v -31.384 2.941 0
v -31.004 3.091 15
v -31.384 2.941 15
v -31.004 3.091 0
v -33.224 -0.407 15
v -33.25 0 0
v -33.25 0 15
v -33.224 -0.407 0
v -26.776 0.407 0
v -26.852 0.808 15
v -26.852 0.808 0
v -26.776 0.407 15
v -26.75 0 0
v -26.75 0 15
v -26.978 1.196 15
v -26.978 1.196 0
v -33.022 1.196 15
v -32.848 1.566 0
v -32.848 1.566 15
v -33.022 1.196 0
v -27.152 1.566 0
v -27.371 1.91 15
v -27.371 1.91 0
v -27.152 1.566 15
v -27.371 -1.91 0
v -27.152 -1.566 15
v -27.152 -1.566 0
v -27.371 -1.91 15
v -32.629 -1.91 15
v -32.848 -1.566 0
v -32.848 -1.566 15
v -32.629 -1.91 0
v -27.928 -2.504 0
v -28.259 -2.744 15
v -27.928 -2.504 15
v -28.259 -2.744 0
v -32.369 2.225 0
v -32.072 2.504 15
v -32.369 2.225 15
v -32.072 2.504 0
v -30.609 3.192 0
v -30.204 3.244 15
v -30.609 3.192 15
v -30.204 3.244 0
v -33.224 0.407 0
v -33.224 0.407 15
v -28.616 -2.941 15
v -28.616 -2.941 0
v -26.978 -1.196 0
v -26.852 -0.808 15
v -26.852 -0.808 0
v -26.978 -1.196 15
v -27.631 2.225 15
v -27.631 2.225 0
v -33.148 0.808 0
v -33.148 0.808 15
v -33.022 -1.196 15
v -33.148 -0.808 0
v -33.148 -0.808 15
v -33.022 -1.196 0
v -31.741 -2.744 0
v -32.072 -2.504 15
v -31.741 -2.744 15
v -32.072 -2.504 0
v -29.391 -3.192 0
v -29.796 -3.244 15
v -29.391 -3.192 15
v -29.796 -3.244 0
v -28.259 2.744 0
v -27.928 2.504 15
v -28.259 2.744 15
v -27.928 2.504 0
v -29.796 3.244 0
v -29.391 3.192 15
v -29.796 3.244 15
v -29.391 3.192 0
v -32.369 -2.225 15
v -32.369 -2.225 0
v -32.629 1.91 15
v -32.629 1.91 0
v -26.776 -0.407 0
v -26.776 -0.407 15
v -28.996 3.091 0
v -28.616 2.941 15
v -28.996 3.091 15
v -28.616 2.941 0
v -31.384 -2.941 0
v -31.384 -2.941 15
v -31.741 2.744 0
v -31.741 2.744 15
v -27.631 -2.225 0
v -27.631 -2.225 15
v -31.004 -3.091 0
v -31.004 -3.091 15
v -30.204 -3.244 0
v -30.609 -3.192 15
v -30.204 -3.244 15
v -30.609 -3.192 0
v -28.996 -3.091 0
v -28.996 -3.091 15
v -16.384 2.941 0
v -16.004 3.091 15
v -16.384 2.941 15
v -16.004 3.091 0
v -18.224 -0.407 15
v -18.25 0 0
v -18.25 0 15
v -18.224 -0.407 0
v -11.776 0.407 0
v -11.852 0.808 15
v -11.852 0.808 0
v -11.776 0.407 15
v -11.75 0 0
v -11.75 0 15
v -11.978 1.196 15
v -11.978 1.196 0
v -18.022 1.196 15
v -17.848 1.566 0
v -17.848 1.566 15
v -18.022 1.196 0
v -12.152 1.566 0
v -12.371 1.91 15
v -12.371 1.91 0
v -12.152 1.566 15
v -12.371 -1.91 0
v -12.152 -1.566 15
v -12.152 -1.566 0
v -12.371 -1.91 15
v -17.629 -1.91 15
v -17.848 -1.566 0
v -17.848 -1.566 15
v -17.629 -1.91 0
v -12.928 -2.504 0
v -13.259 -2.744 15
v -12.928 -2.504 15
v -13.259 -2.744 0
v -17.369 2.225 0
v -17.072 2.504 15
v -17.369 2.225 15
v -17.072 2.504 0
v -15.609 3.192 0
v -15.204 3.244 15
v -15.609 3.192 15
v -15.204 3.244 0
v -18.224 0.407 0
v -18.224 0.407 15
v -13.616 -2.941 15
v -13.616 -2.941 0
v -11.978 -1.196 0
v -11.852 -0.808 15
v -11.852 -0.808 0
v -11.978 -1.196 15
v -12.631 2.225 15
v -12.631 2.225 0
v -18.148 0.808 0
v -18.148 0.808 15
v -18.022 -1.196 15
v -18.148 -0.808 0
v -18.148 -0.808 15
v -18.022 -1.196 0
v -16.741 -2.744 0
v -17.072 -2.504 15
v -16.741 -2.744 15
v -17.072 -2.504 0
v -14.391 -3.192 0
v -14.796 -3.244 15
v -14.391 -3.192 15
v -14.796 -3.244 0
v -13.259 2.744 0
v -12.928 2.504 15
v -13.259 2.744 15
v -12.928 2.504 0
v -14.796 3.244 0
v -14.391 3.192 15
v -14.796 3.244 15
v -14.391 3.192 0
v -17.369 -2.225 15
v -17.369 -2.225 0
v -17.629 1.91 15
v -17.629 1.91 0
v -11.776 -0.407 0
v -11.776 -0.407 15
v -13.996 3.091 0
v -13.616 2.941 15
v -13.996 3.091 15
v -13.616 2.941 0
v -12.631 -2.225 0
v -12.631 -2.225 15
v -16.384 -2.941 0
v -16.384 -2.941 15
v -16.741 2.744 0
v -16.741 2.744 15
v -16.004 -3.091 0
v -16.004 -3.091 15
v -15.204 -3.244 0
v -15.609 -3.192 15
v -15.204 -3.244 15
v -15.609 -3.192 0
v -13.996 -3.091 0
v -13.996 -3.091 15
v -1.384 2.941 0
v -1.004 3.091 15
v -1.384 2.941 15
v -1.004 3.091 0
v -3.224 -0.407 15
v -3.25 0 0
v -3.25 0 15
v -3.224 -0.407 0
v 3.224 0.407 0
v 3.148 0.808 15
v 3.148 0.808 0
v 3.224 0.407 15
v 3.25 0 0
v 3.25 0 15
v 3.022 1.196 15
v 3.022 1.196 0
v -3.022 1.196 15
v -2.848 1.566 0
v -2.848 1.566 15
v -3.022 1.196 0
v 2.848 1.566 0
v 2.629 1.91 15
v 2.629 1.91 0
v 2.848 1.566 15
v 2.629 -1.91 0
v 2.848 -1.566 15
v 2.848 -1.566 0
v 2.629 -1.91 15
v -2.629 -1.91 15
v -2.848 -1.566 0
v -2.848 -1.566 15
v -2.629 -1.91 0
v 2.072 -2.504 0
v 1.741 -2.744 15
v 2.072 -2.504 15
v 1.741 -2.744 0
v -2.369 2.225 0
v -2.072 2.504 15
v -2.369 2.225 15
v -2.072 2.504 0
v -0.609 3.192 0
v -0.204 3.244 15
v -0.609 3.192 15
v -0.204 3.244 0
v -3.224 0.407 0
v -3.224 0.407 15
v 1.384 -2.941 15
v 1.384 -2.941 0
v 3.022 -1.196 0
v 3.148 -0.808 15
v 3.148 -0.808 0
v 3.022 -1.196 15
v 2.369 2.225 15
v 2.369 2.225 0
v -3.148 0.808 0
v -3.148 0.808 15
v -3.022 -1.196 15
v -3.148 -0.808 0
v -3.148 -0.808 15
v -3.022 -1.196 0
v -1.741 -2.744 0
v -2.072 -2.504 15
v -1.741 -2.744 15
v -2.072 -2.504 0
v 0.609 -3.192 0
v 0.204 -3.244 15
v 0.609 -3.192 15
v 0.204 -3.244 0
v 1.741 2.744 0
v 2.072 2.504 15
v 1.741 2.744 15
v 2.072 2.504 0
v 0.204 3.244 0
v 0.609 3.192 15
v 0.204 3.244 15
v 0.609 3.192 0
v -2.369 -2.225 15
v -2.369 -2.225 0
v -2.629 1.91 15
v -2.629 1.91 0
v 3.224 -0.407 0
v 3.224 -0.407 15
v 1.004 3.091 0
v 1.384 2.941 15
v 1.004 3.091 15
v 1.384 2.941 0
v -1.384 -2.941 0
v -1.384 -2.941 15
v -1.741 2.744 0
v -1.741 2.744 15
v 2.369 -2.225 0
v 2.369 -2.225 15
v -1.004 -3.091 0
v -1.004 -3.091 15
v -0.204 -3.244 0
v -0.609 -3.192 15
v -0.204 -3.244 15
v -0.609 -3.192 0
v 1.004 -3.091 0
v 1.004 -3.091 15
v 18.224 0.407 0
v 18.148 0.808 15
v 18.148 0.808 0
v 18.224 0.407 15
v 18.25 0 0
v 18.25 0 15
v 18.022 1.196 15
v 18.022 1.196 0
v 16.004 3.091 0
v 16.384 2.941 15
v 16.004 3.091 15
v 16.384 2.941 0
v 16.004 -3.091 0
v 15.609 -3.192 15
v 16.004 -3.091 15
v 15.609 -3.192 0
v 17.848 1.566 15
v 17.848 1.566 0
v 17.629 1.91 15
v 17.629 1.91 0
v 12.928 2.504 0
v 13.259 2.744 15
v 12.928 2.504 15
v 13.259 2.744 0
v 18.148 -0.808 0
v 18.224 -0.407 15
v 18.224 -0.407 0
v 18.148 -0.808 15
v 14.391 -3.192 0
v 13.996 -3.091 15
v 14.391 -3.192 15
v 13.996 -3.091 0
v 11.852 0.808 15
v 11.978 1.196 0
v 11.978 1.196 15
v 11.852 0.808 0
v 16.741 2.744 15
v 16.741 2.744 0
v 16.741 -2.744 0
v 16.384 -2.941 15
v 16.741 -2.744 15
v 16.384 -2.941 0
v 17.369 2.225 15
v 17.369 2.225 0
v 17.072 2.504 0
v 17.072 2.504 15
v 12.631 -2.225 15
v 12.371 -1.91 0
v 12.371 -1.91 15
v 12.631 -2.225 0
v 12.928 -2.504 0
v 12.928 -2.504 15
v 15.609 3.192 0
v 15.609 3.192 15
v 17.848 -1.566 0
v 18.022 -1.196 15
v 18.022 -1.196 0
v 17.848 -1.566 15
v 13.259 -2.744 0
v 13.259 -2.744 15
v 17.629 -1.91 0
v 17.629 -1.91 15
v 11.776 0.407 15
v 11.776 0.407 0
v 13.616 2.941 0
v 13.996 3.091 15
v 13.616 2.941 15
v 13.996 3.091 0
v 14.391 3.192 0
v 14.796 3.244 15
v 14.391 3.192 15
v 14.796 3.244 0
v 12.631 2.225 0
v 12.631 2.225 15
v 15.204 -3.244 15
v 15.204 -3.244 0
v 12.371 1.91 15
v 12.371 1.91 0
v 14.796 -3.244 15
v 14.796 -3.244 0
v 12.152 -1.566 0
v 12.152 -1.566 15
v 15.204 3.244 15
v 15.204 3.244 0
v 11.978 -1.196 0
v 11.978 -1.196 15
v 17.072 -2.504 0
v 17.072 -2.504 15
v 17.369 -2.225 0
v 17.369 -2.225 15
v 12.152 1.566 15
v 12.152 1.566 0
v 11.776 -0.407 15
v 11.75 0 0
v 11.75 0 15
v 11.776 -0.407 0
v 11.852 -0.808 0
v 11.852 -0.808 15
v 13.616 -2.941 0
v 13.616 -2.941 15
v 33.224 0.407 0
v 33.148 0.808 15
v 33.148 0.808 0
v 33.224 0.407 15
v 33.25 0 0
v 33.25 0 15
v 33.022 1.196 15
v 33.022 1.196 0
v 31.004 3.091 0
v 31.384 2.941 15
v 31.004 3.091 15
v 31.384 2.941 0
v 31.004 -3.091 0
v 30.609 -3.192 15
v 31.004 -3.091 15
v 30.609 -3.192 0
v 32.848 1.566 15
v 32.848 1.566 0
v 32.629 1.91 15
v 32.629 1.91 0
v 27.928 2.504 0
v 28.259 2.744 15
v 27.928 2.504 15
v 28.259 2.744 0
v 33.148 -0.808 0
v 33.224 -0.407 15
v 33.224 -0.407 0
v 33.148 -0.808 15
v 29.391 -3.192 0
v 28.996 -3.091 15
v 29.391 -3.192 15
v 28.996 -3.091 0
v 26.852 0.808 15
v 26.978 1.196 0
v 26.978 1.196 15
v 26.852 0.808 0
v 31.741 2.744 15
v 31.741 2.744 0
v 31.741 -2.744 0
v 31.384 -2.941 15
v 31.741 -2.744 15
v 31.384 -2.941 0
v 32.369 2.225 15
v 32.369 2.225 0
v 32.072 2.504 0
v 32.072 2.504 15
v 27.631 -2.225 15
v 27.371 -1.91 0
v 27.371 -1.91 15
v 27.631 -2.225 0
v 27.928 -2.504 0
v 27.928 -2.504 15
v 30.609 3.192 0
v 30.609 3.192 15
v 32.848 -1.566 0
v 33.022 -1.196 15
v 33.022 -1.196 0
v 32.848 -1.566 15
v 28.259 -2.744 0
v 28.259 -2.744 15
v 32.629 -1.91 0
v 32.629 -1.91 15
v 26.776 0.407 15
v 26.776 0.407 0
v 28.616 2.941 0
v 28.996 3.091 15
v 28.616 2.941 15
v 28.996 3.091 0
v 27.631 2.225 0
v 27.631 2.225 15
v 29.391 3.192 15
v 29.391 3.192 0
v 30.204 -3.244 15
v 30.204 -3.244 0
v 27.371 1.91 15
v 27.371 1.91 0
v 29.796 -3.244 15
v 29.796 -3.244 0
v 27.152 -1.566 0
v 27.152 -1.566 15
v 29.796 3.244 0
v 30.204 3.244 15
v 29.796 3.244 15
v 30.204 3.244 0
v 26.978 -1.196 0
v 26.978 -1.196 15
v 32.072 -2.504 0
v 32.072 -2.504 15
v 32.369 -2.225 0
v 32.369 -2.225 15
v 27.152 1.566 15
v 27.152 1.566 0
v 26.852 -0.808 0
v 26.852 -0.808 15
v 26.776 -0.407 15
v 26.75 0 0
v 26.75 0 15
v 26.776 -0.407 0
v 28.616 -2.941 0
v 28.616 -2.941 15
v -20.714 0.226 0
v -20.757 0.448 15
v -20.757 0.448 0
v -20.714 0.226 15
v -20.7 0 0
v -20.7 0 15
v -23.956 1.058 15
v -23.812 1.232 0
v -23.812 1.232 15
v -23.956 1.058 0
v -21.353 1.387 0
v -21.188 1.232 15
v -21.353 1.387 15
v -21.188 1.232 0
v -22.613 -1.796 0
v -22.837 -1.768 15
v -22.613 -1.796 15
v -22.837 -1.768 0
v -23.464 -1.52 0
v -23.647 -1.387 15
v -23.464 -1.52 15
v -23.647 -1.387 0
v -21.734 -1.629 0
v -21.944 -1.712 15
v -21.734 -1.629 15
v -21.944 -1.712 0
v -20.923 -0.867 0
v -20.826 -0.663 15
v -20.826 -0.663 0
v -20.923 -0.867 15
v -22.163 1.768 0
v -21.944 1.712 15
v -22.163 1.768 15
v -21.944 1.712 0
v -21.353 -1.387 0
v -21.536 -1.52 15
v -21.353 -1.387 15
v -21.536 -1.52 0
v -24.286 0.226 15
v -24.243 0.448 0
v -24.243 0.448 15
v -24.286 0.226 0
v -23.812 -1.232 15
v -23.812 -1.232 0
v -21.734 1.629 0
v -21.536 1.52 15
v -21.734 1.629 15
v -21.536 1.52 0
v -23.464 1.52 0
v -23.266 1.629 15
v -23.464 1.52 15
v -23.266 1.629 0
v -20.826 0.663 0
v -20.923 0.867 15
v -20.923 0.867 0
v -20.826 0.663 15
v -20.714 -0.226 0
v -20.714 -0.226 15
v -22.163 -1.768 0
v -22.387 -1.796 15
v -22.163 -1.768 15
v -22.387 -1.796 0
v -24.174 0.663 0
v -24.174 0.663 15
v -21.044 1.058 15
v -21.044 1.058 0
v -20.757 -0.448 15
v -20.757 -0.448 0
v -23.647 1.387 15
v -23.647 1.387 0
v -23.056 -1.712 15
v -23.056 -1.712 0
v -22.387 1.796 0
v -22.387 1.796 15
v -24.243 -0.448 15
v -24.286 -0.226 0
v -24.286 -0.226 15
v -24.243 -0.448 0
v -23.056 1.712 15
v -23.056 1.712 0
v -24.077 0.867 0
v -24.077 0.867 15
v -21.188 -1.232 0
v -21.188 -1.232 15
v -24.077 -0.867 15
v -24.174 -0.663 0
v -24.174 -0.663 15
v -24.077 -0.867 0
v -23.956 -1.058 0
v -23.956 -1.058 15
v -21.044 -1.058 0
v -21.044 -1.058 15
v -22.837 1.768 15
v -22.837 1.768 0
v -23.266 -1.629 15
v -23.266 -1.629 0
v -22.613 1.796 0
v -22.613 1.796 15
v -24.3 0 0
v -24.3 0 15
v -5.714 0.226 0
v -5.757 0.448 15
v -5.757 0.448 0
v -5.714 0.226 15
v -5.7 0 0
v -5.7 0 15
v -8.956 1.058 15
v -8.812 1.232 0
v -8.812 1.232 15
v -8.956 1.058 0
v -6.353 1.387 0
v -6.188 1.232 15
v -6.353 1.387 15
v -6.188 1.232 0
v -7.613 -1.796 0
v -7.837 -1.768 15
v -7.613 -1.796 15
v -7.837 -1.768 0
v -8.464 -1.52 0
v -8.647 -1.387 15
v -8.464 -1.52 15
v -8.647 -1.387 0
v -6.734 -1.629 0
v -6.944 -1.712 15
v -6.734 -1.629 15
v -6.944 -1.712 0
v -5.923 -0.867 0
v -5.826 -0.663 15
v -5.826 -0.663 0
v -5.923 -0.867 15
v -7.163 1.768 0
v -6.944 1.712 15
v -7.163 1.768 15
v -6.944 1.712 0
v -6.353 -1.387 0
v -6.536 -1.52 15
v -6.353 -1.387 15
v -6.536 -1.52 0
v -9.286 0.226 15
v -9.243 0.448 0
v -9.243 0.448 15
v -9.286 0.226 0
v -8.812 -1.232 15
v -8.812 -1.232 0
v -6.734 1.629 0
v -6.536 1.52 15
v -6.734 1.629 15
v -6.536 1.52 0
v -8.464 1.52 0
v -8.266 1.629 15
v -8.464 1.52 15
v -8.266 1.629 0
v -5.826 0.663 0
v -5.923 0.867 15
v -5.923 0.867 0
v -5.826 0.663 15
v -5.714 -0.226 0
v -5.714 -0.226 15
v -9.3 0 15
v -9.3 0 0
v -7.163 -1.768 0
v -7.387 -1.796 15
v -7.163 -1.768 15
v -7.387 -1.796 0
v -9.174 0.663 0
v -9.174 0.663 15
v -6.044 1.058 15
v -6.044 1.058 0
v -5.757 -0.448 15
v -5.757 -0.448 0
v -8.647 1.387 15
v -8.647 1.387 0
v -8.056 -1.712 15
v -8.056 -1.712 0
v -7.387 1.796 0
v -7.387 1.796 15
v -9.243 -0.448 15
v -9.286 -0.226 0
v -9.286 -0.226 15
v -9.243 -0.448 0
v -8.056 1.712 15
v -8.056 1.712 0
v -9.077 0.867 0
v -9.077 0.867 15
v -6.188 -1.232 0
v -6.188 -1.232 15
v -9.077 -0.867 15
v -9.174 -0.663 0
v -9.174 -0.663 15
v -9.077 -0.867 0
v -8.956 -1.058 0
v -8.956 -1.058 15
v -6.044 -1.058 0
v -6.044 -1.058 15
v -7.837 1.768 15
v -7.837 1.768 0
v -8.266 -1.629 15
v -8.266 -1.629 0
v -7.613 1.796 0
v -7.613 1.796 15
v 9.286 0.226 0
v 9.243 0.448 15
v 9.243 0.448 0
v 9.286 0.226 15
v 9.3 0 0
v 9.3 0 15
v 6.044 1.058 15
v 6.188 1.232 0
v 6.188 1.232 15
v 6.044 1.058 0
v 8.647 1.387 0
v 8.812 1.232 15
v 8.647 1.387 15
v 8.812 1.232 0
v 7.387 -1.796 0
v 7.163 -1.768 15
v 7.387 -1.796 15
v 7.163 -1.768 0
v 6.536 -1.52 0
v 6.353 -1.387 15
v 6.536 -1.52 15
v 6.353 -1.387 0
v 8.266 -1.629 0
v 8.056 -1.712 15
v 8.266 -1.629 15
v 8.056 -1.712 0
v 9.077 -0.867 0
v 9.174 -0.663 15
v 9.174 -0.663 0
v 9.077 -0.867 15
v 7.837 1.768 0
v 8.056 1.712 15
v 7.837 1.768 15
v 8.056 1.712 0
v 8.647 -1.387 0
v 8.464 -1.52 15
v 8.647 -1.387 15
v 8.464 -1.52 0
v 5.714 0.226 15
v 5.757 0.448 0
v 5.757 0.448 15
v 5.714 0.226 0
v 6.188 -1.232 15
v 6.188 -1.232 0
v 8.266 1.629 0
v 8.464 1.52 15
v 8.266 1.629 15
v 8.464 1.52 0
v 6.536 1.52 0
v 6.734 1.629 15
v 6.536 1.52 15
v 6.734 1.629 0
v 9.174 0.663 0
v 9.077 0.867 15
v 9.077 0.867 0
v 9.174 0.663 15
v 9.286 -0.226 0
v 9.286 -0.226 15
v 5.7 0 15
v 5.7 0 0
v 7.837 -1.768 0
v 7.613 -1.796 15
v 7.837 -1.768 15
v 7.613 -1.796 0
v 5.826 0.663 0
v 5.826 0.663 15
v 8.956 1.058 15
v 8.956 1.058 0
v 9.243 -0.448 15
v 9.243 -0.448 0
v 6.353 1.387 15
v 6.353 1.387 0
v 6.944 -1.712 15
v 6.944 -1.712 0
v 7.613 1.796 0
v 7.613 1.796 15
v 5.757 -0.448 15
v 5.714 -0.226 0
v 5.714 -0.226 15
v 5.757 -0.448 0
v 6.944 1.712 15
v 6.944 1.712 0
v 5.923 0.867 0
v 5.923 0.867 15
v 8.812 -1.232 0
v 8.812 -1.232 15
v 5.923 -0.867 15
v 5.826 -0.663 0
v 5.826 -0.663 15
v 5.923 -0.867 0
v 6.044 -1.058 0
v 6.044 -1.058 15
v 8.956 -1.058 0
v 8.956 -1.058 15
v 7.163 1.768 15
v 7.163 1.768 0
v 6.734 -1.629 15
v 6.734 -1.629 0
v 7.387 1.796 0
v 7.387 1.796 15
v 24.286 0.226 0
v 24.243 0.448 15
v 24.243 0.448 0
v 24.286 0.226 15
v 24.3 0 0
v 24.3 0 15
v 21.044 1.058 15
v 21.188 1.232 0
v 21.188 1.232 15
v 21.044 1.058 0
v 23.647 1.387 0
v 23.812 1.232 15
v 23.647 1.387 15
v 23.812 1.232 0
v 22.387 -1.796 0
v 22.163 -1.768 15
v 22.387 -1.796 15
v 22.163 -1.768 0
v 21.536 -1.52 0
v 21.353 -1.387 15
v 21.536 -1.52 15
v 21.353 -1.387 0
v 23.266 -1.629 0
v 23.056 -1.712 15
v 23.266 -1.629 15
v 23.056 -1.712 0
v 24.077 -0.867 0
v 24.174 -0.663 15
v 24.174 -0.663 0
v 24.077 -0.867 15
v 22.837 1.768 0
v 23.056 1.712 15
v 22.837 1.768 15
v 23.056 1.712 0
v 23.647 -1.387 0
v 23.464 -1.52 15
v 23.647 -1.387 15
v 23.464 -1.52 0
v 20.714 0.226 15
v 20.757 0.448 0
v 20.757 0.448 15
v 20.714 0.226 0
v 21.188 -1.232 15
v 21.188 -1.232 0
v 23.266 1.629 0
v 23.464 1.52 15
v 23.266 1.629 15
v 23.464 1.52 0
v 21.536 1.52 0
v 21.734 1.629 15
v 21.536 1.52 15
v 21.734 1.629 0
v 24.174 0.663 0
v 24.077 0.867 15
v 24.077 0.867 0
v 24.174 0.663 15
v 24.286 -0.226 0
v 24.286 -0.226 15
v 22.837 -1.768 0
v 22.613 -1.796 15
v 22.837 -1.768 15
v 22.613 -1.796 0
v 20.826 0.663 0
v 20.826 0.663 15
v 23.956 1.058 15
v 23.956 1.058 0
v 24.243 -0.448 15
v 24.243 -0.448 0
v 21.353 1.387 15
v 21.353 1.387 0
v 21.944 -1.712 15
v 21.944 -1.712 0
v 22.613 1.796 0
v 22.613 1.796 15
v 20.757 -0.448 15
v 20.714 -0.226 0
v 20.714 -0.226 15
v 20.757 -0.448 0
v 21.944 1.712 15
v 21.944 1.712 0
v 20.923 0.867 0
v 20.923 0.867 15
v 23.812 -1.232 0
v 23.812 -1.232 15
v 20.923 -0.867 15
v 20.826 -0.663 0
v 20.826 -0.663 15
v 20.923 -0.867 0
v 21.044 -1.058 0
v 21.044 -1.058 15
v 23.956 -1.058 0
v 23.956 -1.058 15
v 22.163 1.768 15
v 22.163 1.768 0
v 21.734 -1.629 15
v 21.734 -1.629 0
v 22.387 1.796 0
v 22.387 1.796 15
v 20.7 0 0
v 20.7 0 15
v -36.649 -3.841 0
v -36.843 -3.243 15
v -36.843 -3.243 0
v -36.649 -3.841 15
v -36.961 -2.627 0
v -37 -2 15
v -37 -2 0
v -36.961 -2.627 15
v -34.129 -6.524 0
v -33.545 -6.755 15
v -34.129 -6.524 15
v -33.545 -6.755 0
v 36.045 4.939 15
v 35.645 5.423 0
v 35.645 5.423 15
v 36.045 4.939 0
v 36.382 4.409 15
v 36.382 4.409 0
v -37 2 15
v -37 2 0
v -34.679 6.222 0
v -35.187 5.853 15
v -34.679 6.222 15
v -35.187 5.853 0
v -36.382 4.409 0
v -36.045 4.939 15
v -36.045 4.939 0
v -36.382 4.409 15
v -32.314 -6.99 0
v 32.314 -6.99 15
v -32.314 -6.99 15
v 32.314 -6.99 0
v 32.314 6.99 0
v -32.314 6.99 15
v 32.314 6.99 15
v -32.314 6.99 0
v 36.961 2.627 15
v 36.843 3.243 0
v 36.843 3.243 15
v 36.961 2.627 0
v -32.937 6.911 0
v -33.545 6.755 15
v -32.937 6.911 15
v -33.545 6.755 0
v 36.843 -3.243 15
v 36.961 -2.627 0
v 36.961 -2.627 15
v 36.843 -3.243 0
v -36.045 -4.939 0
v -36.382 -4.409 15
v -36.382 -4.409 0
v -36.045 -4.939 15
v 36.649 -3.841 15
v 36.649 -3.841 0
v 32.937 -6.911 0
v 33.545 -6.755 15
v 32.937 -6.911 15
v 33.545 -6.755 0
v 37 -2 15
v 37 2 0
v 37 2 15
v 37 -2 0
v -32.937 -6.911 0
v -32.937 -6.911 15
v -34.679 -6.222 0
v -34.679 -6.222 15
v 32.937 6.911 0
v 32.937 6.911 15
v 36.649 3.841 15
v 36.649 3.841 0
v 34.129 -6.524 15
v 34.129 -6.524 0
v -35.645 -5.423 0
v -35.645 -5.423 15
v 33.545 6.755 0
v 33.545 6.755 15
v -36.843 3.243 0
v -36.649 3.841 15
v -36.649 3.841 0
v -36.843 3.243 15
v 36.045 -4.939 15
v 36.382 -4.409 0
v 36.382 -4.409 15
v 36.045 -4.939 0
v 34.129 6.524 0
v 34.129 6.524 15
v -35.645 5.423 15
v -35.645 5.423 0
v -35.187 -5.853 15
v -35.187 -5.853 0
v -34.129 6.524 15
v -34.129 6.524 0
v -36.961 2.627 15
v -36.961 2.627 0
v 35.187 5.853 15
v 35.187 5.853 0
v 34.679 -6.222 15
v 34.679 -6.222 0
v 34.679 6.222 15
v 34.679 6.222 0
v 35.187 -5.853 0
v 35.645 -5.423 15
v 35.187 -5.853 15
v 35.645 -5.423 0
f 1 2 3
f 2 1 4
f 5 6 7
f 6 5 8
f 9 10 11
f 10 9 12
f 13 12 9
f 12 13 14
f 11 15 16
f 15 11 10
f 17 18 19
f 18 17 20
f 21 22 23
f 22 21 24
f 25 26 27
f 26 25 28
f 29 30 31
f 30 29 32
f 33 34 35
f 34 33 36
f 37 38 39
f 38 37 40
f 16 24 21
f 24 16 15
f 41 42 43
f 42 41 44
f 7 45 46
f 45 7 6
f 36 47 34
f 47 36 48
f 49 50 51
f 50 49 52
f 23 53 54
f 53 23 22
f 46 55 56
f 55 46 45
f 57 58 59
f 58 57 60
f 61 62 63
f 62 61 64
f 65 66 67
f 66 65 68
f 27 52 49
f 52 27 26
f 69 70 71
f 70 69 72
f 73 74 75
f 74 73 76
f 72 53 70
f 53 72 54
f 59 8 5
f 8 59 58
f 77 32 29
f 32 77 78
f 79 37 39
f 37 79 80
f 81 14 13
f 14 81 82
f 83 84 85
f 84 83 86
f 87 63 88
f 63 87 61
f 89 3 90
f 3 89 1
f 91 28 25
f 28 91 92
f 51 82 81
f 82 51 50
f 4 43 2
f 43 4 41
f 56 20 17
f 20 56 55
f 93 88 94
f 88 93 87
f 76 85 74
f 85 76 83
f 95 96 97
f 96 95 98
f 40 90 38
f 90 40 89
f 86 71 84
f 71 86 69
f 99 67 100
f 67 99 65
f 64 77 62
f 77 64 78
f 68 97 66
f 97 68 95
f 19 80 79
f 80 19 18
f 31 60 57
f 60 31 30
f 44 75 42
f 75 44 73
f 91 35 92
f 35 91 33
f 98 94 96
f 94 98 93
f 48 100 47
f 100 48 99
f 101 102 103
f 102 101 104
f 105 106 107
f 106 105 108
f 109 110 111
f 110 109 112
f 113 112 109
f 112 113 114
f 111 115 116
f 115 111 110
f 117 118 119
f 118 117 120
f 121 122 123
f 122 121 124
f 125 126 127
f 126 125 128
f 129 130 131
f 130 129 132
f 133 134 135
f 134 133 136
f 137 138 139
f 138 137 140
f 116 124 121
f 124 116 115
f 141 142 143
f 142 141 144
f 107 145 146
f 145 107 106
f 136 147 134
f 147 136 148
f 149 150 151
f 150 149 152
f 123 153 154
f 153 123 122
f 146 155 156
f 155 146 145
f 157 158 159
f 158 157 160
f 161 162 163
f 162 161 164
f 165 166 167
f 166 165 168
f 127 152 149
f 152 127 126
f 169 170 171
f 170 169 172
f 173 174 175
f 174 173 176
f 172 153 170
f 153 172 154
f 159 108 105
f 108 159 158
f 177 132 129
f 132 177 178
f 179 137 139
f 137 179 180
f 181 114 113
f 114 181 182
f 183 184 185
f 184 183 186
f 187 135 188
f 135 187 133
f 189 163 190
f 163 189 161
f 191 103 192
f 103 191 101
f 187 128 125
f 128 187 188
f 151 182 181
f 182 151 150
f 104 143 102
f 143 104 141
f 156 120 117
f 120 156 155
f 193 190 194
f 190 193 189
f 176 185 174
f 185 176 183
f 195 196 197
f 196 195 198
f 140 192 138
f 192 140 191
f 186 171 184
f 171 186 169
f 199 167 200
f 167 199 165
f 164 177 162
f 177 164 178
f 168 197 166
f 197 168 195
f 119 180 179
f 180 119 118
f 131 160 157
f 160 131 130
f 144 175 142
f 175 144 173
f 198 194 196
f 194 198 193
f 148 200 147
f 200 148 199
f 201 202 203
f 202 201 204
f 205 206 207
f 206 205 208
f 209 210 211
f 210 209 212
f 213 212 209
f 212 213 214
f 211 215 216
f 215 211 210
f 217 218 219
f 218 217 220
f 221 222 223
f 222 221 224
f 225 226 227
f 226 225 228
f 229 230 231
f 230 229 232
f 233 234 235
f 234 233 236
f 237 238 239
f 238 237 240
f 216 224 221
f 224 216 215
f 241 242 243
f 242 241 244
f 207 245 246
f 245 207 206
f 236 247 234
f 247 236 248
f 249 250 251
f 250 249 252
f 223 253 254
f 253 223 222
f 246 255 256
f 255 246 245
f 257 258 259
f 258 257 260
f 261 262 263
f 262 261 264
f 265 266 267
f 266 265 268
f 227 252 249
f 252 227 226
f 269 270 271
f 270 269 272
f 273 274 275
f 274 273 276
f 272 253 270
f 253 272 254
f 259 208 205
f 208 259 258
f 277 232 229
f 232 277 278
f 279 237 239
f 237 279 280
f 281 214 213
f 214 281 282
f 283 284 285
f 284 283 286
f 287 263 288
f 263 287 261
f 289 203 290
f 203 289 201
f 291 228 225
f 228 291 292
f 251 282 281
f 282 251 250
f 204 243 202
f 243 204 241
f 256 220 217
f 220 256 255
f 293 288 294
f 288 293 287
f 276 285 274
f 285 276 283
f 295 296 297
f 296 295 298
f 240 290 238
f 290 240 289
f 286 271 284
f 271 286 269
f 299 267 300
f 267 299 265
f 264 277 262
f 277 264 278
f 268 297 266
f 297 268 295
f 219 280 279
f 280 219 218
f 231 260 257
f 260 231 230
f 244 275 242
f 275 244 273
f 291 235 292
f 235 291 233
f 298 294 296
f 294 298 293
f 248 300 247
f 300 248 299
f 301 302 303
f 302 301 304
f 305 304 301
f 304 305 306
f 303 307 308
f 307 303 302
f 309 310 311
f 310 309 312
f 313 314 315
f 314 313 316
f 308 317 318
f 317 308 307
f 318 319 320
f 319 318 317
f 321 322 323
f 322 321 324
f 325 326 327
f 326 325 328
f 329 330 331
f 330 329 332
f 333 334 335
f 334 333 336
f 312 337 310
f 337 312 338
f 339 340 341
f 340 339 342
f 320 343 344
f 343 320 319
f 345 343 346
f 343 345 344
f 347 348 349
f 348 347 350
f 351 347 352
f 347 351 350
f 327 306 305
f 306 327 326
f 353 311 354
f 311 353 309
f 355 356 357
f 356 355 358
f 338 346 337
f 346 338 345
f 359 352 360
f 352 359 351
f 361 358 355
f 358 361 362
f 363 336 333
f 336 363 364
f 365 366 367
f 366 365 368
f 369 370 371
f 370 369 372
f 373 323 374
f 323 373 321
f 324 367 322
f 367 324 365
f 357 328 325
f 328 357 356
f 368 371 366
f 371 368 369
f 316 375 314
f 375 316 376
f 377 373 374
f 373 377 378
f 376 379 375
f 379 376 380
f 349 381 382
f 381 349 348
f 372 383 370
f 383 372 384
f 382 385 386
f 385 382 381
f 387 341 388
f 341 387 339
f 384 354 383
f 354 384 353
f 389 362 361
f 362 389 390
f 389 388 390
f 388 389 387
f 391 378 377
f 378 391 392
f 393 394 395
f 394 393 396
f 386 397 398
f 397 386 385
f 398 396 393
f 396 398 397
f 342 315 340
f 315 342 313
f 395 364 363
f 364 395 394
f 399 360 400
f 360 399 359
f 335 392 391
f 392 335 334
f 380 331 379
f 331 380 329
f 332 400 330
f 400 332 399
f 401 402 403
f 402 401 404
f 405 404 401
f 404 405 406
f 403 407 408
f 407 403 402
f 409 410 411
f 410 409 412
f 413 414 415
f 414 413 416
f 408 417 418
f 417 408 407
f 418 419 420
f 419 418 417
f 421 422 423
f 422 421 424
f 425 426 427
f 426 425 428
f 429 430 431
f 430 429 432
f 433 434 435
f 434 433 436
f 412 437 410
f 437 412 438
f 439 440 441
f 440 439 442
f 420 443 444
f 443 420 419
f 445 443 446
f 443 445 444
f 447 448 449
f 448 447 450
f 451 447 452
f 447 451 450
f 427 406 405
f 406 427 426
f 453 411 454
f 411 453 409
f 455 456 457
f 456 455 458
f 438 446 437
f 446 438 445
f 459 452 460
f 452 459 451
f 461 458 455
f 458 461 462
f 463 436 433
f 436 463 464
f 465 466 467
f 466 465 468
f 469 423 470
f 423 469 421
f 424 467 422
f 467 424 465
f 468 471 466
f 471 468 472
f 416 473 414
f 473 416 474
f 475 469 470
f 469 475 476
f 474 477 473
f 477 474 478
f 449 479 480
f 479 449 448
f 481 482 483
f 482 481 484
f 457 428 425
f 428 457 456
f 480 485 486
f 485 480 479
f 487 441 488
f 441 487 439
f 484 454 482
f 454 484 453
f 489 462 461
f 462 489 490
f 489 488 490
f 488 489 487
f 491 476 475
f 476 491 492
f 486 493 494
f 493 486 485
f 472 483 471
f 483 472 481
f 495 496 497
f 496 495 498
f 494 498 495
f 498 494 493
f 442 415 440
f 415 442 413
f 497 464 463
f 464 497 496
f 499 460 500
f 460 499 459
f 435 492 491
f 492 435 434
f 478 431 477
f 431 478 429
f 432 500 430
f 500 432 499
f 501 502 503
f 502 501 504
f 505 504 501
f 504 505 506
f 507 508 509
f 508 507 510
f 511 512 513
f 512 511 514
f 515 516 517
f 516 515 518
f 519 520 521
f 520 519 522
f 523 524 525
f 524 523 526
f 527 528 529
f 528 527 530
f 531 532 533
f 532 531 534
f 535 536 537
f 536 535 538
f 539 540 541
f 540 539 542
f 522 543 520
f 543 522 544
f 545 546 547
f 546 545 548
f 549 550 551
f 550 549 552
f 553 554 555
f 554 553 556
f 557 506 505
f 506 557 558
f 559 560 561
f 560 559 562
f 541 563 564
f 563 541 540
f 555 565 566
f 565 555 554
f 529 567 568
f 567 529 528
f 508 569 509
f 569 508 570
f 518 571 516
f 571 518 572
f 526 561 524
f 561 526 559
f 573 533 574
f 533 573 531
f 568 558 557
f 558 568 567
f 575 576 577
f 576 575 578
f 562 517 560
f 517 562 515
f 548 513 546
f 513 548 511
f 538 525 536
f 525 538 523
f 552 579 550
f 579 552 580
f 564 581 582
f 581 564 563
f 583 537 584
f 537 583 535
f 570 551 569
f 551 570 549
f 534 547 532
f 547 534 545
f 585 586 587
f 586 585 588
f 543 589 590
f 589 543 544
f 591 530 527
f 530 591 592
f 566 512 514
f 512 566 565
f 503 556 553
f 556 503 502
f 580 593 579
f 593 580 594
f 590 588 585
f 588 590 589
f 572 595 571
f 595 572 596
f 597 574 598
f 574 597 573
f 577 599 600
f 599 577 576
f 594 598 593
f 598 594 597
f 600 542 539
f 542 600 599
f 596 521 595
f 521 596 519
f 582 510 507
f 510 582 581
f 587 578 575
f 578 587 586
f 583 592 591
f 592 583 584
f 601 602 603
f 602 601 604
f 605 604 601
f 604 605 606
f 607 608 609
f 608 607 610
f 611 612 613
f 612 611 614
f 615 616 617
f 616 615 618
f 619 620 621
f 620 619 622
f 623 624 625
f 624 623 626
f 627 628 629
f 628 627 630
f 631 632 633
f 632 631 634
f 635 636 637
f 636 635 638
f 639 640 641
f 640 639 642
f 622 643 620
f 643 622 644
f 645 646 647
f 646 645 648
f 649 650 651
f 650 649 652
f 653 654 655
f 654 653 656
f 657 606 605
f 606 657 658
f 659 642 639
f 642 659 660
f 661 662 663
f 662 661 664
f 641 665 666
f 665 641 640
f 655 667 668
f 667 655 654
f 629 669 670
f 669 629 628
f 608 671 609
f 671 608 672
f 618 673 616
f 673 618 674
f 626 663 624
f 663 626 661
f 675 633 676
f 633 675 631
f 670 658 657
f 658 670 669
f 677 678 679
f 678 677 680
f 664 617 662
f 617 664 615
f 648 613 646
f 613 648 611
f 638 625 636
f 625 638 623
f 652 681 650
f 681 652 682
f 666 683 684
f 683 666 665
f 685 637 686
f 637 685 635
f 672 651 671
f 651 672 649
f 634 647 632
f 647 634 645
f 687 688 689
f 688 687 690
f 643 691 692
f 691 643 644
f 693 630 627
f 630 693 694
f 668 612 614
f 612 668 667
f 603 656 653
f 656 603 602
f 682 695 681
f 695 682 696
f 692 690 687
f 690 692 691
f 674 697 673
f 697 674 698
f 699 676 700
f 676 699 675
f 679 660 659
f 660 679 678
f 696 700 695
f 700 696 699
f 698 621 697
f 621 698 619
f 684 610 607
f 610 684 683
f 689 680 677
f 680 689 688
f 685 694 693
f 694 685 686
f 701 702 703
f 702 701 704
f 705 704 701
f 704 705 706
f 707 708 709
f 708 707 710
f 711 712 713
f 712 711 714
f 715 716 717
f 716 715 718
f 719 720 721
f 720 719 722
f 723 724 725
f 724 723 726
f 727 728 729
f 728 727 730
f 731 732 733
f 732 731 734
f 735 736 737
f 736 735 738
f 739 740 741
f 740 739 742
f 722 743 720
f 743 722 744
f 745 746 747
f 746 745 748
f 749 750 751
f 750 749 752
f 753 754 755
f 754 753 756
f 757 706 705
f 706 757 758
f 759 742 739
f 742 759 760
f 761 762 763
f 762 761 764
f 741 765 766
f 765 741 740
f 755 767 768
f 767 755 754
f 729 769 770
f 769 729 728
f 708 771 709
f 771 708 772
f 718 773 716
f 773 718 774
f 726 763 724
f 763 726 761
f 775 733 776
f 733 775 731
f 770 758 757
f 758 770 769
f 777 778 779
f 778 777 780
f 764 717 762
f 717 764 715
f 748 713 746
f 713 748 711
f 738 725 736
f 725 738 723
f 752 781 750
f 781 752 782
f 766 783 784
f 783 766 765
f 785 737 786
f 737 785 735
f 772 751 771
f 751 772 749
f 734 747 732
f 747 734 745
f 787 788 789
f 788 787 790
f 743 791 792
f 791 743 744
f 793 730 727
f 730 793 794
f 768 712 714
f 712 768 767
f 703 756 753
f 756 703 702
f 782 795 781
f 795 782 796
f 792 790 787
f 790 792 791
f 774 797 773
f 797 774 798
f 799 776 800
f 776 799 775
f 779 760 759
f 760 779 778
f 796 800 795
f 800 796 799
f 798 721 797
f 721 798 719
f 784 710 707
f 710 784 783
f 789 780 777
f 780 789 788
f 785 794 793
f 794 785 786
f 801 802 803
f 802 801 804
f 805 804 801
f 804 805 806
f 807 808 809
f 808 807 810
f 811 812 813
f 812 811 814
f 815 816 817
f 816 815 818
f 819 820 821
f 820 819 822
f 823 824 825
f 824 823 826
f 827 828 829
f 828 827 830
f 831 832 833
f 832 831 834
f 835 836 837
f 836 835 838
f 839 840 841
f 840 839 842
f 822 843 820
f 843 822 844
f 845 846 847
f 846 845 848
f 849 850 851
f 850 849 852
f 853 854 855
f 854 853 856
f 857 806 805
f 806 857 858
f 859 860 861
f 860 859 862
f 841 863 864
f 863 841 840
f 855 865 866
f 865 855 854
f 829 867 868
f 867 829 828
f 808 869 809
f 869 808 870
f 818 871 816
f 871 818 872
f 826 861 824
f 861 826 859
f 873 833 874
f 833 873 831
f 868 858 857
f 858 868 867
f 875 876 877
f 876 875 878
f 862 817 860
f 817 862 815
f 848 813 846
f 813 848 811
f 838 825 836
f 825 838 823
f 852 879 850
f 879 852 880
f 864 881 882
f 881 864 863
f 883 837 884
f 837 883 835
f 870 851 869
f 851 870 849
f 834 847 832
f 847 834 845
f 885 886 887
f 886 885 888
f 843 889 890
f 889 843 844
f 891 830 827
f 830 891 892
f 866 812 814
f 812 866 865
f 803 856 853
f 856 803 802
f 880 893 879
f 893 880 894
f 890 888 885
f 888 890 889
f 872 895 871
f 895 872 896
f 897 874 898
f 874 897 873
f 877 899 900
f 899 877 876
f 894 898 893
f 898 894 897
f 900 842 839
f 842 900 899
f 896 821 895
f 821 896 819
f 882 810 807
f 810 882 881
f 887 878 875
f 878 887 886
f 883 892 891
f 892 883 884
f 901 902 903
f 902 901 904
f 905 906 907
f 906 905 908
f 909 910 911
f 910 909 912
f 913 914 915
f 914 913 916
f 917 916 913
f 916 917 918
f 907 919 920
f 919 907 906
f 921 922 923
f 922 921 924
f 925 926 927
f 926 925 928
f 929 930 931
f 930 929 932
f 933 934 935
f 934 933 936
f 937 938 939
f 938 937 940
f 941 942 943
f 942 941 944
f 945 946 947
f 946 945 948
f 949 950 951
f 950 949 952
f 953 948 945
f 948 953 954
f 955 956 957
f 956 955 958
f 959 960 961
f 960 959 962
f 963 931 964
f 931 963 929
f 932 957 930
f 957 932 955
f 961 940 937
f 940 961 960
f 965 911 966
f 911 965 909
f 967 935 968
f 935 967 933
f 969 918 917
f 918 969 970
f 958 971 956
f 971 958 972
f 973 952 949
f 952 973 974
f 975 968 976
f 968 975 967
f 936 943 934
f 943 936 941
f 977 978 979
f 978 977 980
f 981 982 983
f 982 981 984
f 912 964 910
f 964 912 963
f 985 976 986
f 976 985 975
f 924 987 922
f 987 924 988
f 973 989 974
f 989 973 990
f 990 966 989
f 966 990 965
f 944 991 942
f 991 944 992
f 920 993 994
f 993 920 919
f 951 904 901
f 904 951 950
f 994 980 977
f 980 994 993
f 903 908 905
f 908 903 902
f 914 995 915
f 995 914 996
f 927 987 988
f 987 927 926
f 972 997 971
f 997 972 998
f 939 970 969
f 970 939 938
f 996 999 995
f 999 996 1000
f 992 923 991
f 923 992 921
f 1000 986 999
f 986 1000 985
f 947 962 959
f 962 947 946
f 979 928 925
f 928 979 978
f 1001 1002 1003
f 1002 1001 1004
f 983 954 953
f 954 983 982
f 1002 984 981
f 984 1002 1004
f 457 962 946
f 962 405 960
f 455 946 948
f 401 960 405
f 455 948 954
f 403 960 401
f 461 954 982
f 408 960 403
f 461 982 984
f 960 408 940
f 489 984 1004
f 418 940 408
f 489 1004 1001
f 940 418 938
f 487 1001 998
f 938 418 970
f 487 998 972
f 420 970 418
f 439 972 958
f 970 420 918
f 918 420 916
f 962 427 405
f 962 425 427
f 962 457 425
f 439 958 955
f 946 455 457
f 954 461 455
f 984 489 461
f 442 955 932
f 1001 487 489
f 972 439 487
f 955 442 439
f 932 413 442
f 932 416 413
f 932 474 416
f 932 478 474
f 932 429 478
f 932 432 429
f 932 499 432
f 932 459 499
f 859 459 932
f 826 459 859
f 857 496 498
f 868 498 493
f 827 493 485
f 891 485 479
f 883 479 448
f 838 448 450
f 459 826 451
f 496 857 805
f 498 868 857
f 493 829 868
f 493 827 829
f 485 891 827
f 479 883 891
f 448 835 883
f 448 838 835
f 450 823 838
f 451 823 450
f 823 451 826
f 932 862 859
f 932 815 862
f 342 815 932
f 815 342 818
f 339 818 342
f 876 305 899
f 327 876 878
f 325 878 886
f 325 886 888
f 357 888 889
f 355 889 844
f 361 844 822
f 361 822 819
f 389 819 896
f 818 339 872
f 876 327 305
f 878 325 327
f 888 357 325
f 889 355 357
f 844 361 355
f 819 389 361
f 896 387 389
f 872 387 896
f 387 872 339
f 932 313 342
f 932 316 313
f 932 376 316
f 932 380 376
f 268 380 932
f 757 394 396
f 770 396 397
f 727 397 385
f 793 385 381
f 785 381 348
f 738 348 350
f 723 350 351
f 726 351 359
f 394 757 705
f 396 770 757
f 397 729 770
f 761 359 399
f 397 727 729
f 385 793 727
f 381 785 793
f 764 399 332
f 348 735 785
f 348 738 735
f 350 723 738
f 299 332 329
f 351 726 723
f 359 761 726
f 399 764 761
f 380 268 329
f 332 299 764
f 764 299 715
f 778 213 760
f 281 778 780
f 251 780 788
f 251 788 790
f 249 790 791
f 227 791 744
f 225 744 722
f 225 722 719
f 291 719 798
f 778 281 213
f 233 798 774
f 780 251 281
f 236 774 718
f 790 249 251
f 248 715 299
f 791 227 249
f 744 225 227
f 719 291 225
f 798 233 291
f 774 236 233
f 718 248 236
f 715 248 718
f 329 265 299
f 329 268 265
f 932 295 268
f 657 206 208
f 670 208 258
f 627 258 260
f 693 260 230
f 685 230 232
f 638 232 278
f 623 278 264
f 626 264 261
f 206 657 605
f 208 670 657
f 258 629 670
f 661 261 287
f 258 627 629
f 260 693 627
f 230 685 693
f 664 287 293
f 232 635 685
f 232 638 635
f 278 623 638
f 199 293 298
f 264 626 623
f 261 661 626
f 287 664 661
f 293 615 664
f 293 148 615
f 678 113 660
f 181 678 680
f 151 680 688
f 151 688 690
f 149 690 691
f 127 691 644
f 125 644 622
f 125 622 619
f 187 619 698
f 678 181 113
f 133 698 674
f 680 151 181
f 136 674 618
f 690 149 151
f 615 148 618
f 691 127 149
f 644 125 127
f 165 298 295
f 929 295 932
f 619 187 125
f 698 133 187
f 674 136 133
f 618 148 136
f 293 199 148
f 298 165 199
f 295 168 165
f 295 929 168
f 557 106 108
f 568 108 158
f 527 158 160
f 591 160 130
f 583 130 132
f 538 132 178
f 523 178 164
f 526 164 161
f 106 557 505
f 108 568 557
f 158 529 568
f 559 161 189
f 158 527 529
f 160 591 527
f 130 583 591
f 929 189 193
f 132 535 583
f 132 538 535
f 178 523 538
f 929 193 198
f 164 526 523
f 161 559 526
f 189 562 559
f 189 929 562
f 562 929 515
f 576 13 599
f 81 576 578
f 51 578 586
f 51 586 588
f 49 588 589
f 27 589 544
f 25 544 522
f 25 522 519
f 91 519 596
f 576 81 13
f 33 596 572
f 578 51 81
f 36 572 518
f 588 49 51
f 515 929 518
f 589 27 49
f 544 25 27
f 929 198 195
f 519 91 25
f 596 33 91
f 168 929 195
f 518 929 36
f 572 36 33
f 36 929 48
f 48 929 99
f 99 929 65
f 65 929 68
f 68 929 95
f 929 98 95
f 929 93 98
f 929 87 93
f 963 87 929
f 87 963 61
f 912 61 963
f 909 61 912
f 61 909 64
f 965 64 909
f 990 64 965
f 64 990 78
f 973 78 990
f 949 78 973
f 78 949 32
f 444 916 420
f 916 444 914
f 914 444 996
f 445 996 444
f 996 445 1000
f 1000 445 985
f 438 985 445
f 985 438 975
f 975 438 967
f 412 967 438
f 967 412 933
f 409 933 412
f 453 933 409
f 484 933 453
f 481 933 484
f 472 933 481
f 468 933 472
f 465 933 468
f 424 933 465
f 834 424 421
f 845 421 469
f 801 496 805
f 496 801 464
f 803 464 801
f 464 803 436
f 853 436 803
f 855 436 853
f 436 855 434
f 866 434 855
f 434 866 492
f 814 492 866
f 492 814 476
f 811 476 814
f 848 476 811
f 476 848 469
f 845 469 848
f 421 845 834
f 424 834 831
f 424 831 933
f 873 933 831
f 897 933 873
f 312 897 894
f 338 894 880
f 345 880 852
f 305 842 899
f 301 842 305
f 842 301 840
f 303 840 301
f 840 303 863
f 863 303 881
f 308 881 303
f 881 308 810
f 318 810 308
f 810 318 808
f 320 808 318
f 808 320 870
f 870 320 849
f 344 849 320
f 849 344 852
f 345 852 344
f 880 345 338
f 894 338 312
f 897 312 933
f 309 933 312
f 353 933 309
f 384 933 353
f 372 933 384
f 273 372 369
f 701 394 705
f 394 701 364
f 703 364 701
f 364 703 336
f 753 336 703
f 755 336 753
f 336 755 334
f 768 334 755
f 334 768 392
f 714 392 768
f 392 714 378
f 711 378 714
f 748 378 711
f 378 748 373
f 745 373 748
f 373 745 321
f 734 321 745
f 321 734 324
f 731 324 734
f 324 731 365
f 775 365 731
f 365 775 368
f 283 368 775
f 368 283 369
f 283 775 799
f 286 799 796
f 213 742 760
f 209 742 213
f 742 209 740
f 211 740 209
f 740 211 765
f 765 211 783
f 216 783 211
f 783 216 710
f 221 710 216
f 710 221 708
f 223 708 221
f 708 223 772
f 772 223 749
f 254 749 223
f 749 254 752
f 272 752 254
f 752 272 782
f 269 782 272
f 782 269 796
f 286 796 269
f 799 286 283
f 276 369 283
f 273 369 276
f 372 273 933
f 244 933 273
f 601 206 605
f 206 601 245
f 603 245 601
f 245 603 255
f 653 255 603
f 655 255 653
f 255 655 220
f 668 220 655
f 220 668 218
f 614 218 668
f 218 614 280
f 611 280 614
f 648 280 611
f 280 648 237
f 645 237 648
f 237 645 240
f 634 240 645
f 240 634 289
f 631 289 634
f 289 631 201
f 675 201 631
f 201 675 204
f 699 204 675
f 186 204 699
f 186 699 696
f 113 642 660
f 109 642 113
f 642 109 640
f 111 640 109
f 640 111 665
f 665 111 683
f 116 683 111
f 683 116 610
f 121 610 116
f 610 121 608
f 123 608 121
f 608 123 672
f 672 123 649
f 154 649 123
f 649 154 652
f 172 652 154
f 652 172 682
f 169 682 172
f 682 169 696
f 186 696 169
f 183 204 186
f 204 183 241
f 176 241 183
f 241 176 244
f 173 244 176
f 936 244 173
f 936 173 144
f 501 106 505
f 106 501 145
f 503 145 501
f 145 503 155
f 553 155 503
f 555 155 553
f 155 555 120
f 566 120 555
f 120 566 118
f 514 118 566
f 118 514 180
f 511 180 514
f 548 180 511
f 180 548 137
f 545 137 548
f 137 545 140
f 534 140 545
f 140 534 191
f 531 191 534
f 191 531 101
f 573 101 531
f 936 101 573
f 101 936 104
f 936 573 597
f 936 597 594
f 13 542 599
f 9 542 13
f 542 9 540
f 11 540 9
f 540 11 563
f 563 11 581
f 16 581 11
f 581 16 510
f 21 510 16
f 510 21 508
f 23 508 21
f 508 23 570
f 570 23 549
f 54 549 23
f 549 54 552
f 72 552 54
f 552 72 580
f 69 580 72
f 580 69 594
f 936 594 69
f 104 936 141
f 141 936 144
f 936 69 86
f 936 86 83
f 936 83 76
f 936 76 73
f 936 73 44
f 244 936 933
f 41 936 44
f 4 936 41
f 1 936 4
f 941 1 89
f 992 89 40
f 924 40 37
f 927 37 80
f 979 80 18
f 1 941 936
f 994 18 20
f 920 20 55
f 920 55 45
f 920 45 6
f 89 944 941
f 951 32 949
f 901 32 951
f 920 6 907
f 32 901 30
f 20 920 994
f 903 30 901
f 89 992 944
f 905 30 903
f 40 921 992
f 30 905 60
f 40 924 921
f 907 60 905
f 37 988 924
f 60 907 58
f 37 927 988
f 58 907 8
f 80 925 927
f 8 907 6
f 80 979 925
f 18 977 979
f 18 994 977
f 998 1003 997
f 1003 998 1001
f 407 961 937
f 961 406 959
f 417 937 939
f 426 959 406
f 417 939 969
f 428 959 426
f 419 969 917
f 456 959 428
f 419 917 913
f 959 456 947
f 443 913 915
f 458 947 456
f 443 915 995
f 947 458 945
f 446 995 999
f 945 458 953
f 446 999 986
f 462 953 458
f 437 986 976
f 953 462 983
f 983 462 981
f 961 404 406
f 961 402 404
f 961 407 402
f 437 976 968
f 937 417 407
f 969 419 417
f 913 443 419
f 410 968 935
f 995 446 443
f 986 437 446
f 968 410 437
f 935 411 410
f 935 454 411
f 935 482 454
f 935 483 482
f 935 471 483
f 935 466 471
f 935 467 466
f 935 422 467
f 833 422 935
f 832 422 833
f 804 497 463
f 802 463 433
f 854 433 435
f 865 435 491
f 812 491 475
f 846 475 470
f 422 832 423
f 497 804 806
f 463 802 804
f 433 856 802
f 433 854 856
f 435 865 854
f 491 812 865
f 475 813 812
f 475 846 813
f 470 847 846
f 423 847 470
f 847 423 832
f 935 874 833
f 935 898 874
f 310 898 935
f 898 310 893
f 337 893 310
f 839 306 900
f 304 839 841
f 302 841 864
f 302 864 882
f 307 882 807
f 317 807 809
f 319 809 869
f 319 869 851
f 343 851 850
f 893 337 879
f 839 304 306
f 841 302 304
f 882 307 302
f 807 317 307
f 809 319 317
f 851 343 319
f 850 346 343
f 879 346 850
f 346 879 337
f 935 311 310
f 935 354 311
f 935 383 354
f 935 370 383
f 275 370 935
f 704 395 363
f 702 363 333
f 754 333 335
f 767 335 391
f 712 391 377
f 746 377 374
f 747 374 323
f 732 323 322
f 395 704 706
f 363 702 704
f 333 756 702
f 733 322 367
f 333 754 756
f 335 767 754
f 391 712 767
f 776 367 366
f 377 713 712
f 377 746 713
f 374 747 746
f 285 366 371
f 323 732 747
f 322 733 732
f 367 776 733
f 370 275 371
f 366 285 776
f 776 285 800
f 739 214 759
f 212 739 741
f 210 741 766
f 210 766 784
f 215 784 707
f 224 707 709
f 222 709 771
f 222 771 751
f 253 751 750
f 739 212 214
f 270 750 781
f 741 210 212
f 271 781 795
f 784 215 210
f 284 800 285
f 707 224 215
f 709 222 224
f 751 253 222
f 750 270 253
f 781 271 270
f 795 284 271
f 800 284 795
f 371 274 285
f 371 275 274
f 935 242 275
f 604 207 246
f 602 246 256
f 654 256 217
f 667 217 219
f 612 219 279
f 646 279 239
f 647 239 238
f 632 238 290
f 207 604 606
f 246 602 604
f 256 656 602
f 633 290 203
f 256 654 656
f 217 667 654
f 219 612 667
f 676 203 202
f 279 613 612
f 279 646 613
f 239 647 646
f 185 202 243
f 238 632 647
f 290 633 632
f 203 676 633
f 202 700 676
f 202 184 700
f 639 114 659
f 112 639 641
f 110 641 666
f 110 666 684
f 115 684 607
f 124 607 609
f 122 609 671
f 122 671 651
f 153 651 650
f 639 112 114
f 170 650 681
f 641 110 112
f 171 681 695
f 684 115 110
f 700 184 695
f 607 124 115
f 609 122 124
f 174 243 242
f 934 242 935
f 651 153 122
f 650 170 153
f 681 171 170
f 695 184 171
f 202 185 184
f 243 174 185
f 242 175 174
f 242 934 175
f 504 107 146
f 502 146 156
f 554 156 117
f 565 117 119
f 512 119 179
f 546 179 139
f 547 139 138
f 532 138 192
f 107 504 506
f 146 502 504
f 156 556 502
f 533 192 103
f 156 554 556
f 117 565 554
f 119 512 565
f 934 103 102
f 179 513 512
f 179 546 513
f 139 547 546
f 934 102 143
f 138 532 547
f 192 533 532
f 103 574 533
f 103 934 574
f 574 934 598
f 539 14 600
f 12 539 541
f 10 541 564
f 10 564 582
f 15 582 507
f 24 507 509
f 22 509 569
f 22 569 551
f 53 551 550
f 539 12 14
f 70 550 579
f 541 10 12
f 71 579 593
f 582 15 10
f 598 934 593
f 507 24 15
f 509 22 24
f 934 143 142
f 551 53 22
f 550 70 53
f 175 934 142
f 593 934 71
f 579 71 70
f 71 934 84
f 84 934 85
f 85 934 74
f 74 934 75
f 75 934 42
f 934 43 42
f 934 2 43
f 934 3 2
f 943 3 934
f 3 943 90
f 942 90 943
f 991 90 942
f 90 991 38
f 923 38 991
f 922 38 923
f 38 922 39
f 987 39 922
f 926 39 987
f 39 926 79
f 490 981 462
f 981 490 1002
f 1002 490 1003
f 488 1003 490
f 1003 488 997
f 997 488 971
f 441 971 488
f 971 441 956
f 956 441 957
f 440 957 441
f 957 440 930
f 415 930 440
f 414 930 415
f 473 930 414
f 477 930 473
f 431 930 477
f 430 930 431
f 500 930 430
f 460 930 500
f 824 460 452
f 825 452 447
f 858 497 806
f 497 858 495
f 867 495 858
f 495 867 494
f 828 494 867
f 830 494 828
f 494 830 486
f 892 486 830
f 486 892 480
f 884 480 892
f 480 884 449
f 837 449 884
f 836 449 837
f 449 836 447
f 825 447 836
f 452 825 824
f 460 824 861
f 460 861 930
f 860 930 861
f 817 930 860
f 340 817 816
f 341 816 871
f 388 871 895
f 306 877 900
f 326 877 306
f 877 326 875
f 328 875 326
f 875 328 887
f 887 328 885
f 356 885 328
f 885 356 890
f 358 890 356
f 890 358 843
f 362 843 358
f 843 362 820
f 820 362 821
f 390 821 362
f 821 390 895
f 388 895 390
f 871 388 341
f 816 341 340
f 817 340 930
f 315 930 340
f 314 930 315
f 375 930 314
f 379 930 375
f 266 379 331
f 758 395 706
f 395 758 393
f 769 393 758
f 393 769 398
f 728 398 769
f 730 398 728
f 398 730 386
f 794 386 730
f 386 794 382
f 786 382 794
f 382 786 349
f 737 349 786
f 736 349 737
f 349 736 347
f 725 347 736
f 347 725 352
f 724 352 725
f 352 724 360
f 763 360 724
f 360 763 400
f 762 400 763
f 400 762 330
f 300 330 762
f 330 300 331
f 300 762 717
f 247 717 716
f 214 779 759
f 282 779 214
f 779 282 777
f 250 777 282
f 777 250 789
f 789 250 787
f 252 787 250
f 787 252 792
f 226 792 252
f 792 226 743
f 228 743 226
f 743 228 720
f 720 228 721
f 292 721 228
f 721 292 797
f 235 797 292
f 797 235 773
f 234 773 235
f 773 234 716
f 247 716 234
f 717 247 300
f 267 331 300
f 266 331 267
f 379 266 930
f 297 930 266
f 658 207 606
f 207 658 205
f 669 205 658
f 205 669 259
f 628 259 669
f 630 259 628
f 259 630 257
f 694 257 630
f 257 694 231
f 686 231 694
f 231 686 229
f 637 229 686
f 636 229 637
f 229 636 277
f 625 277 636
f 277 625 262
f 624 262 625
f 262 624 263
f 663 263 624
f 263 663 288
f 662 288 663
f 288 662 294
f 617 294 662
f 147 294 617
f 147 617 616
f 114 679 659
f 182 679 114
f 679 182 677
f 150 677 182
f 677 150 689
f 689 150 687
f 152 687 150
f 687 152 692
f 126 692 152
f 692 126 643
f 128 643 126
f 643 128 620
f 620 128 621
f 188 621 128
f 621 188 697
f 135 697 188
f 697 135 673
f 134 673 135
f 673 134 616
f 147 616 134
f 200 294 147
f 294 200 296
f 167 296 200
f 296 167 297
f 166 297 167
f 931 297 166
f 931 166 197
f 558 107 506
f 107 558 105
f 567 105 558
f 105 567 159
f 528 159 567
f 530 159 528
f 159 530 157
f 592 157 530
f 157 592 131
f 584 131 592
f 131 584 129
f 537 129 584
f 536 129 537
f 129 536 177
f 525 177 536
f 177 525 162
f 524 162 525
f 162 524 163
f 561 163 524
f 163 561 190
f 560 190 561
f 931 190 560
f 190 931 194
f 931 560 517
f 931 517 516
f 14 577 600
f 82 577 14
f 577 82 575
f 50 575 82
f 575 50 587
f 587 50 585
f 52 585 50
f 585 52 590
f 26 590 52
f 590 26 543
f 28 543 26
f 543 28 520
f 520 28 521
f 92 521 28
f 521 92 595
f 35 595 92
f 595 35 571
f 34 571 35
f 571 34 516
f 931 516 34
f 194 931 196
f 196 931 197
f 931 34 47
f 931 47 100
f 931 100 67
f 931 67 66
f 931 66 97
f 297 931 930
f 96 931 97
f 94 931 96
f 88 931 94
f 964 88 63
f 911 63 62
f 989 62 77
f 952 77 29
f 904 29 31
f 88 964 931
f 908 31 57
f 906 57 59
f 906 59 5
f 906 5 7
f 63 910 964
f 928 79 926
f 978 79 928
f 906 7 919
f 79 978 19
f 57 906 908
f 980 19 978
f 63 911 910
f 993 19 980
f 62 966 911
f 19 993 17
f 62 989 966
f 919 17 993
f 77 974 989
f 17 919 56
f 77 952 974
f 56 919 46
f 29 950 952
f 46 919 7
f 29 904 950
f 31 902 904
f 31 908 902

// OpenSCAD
$fn = 50;


difference() {
	union() {
		translate(v = [0, 0, 0]) {
			rotate(a = [0, 0, 0]) {
				hull() {
					translate(v = [-32.0000000000, 2.0000000000, 0]) {
						rotate(a = [0, 0, 0]) {
							translate(v = [0, 0, 0]) {
								rotate(a = [0, 0, 0]) {
									cylinder(h = 15, r = 5);
								}
							}
						}
					}
					translate(v = [32.0000000000, 2.0000000000, 0]) {
						rotate(a = [0, 0, 0]) {
							translate(v = [0, 0, 0]) {
								rotate(a = [0, 0, 0]) {
									cylinder(h = 15, r = 5);
								}
							}
						}
					}
					translate(v = [-32.0000000000, -2.0000000000, 0]) {
						rotate(a = [0, 0, 0]) {
							translate(v = [0, 0, 0]) {
								rotate(a = [0, 0, 0]) {
									cylinder(h = 15, r = 5);
								}
							}
						}
					}
					translate(v = [32.0000000000, -2.0000000000, 0]) {
						rotate(a = [0, 0, 0]) {
							translate(v = [0, 0, 0]) {
								rotate(a = [0, 0, 0]) {
									cylinder(h = 15, r = 5);
								}
							}
						}
					}
				}
			}
		}
	}
	union() {
		translate(v = [-30.0000000000, 0.0000000000, 0]) {
			rotate(a = [0, 0, 0]) {
				translate(v = [0, 0, -50]) {
					rotate(a = [0, 0, 0]) {
						cylinder(h = 100, r = 3.2500000000);
					}
				}
			}
		}
		translate(v = [-15.0000000000, 0.0000000000, 0]) {
			rotate(a = [0, 0, 0]) {
				translate(v = [0, 0, -50]) {
					rotate(a = [0, 0, 0]) {
						cylinder(h = 100, r = 3.2500000000);
					}
				}
			}
		}
		translate(v = [0.0000000000, 0.0000000000, 0]) {
			rotate(a = [0, 0, 0]) {
				translate(v = [0, 0, -50]) {
					rotate(a = [0, 0, 0]) {
						cylinder(h = 100, r = 3.2500000000);
					}
				}
			}
		}
		translate(v = [15.0000000000, 0.0000000000, 0]) {
			rotate(a = [0, 0, 0]) {
				translate(v = [0, 0, -50]) {
					rotate(a = [0, 0, 0]) {
						cylinder(h = 100, r = 3.2500000000);
					}
				}
			}
		}
		translate(v = [30.0000000000, 0.0000000000, 0]) {
			rotate(a = [0, 0, 0]) {
				translate(v = [0, 0, -50]) {
					rotate(a = [0, 0, 0]) {
						cylinder(h = 100, r = 3.2500000000);
					}
				}
			}
		}
		translate(v = [-30.0000000000, 0.0000000000, 0]) {
			rotate(a = [0, 0, 0]) {
				translate(v = [0, 0, -50]) {
					rotate(a = [0, 0, 0]) {
						cylinder(h = 100, r = 1.8000000000);
					}
				}
			}
		}
		translate(v = [-22.5000000000, 0.0000000000, 0]) {
			rotate(a = [0, 0, 0]) {
				translate(v = [0, 0, -50]) {
					rotate(a = [0, 0, 0]) {
						cylinder(h = 100, r = 1.8000000000);
					}
				}
			}
		}
		translate(v = [-15.0000000000, 0.0000000000, 0]) {
			rotate(a = [0, 0, 0]) {
				translate(v = [0, 0, -50]) {
					rotate(a = [0, 0, 0]) {
						cylinder(h = 100, r = 1.8000000000);
					}
				}
			}
		}
		translate(v = [-7.5000000000, 0.0000000000, 0]) {
			rotate(a = [0, 0, 0]) {
				translate(v = [0, 0, -50]) {
					rotate(a = [0, 0, 0]) {
						cylinder(h = 100, r = 1.8000000000);
					}
				}
			}
		}
		translate(v = [0.0000000000, 0.0000000000, 0]) {
			rotate(a = [0, 0, 0]) {
				translate(v = [0, 0, -50]) {
					rotate(a = [0, 0, 0]) {
						cylinder(h = 100, r = 1.8000000000);
					}
				}
			}
		}
		translate(v = [7.5000000000, 0.0000000000, 0]) {
			rotate(a = [0, 0, 0]) {
				translate(v = [0, 0, -50]) {
					rotate(a = [0, 0, 0]) {
						cylinder(h = 100, r = 1.8000000000);
					}
				}
			}
		}
		translate(v = [15.0000000000, 0.0000000000, 0]) {
			rotate(a = [0, 0, 0]) {
				translate(v = [0, 0, -50]) {
					rotate(a = [0, 0, 0]) {
						cylinder(h = 100, r = 1.8000000000);
					}
				}
			}
		}
		translate(v = [22.5000000000, 0.0000000000, 0]) {
			rotate(a = [0, 0, 0]) {
				translate(v = [0, 0, -50]) {
					rotate(a = [0, 0, 0]) {
						cylinder(h = 100, r = 1.8000000000);
					}
				}
			}
		}
		translate(v = [30.0000000000, 0.0000000000, 0]) {
			rotate(a = [0, 0, 0]) {
				translate(v = [0, 0, -50]) {
					rotate(a = [0, 0, 0]) {
						cylinder(h = 100, r = 1.8000000000);
					}
				}
			}
		}
	}
}
